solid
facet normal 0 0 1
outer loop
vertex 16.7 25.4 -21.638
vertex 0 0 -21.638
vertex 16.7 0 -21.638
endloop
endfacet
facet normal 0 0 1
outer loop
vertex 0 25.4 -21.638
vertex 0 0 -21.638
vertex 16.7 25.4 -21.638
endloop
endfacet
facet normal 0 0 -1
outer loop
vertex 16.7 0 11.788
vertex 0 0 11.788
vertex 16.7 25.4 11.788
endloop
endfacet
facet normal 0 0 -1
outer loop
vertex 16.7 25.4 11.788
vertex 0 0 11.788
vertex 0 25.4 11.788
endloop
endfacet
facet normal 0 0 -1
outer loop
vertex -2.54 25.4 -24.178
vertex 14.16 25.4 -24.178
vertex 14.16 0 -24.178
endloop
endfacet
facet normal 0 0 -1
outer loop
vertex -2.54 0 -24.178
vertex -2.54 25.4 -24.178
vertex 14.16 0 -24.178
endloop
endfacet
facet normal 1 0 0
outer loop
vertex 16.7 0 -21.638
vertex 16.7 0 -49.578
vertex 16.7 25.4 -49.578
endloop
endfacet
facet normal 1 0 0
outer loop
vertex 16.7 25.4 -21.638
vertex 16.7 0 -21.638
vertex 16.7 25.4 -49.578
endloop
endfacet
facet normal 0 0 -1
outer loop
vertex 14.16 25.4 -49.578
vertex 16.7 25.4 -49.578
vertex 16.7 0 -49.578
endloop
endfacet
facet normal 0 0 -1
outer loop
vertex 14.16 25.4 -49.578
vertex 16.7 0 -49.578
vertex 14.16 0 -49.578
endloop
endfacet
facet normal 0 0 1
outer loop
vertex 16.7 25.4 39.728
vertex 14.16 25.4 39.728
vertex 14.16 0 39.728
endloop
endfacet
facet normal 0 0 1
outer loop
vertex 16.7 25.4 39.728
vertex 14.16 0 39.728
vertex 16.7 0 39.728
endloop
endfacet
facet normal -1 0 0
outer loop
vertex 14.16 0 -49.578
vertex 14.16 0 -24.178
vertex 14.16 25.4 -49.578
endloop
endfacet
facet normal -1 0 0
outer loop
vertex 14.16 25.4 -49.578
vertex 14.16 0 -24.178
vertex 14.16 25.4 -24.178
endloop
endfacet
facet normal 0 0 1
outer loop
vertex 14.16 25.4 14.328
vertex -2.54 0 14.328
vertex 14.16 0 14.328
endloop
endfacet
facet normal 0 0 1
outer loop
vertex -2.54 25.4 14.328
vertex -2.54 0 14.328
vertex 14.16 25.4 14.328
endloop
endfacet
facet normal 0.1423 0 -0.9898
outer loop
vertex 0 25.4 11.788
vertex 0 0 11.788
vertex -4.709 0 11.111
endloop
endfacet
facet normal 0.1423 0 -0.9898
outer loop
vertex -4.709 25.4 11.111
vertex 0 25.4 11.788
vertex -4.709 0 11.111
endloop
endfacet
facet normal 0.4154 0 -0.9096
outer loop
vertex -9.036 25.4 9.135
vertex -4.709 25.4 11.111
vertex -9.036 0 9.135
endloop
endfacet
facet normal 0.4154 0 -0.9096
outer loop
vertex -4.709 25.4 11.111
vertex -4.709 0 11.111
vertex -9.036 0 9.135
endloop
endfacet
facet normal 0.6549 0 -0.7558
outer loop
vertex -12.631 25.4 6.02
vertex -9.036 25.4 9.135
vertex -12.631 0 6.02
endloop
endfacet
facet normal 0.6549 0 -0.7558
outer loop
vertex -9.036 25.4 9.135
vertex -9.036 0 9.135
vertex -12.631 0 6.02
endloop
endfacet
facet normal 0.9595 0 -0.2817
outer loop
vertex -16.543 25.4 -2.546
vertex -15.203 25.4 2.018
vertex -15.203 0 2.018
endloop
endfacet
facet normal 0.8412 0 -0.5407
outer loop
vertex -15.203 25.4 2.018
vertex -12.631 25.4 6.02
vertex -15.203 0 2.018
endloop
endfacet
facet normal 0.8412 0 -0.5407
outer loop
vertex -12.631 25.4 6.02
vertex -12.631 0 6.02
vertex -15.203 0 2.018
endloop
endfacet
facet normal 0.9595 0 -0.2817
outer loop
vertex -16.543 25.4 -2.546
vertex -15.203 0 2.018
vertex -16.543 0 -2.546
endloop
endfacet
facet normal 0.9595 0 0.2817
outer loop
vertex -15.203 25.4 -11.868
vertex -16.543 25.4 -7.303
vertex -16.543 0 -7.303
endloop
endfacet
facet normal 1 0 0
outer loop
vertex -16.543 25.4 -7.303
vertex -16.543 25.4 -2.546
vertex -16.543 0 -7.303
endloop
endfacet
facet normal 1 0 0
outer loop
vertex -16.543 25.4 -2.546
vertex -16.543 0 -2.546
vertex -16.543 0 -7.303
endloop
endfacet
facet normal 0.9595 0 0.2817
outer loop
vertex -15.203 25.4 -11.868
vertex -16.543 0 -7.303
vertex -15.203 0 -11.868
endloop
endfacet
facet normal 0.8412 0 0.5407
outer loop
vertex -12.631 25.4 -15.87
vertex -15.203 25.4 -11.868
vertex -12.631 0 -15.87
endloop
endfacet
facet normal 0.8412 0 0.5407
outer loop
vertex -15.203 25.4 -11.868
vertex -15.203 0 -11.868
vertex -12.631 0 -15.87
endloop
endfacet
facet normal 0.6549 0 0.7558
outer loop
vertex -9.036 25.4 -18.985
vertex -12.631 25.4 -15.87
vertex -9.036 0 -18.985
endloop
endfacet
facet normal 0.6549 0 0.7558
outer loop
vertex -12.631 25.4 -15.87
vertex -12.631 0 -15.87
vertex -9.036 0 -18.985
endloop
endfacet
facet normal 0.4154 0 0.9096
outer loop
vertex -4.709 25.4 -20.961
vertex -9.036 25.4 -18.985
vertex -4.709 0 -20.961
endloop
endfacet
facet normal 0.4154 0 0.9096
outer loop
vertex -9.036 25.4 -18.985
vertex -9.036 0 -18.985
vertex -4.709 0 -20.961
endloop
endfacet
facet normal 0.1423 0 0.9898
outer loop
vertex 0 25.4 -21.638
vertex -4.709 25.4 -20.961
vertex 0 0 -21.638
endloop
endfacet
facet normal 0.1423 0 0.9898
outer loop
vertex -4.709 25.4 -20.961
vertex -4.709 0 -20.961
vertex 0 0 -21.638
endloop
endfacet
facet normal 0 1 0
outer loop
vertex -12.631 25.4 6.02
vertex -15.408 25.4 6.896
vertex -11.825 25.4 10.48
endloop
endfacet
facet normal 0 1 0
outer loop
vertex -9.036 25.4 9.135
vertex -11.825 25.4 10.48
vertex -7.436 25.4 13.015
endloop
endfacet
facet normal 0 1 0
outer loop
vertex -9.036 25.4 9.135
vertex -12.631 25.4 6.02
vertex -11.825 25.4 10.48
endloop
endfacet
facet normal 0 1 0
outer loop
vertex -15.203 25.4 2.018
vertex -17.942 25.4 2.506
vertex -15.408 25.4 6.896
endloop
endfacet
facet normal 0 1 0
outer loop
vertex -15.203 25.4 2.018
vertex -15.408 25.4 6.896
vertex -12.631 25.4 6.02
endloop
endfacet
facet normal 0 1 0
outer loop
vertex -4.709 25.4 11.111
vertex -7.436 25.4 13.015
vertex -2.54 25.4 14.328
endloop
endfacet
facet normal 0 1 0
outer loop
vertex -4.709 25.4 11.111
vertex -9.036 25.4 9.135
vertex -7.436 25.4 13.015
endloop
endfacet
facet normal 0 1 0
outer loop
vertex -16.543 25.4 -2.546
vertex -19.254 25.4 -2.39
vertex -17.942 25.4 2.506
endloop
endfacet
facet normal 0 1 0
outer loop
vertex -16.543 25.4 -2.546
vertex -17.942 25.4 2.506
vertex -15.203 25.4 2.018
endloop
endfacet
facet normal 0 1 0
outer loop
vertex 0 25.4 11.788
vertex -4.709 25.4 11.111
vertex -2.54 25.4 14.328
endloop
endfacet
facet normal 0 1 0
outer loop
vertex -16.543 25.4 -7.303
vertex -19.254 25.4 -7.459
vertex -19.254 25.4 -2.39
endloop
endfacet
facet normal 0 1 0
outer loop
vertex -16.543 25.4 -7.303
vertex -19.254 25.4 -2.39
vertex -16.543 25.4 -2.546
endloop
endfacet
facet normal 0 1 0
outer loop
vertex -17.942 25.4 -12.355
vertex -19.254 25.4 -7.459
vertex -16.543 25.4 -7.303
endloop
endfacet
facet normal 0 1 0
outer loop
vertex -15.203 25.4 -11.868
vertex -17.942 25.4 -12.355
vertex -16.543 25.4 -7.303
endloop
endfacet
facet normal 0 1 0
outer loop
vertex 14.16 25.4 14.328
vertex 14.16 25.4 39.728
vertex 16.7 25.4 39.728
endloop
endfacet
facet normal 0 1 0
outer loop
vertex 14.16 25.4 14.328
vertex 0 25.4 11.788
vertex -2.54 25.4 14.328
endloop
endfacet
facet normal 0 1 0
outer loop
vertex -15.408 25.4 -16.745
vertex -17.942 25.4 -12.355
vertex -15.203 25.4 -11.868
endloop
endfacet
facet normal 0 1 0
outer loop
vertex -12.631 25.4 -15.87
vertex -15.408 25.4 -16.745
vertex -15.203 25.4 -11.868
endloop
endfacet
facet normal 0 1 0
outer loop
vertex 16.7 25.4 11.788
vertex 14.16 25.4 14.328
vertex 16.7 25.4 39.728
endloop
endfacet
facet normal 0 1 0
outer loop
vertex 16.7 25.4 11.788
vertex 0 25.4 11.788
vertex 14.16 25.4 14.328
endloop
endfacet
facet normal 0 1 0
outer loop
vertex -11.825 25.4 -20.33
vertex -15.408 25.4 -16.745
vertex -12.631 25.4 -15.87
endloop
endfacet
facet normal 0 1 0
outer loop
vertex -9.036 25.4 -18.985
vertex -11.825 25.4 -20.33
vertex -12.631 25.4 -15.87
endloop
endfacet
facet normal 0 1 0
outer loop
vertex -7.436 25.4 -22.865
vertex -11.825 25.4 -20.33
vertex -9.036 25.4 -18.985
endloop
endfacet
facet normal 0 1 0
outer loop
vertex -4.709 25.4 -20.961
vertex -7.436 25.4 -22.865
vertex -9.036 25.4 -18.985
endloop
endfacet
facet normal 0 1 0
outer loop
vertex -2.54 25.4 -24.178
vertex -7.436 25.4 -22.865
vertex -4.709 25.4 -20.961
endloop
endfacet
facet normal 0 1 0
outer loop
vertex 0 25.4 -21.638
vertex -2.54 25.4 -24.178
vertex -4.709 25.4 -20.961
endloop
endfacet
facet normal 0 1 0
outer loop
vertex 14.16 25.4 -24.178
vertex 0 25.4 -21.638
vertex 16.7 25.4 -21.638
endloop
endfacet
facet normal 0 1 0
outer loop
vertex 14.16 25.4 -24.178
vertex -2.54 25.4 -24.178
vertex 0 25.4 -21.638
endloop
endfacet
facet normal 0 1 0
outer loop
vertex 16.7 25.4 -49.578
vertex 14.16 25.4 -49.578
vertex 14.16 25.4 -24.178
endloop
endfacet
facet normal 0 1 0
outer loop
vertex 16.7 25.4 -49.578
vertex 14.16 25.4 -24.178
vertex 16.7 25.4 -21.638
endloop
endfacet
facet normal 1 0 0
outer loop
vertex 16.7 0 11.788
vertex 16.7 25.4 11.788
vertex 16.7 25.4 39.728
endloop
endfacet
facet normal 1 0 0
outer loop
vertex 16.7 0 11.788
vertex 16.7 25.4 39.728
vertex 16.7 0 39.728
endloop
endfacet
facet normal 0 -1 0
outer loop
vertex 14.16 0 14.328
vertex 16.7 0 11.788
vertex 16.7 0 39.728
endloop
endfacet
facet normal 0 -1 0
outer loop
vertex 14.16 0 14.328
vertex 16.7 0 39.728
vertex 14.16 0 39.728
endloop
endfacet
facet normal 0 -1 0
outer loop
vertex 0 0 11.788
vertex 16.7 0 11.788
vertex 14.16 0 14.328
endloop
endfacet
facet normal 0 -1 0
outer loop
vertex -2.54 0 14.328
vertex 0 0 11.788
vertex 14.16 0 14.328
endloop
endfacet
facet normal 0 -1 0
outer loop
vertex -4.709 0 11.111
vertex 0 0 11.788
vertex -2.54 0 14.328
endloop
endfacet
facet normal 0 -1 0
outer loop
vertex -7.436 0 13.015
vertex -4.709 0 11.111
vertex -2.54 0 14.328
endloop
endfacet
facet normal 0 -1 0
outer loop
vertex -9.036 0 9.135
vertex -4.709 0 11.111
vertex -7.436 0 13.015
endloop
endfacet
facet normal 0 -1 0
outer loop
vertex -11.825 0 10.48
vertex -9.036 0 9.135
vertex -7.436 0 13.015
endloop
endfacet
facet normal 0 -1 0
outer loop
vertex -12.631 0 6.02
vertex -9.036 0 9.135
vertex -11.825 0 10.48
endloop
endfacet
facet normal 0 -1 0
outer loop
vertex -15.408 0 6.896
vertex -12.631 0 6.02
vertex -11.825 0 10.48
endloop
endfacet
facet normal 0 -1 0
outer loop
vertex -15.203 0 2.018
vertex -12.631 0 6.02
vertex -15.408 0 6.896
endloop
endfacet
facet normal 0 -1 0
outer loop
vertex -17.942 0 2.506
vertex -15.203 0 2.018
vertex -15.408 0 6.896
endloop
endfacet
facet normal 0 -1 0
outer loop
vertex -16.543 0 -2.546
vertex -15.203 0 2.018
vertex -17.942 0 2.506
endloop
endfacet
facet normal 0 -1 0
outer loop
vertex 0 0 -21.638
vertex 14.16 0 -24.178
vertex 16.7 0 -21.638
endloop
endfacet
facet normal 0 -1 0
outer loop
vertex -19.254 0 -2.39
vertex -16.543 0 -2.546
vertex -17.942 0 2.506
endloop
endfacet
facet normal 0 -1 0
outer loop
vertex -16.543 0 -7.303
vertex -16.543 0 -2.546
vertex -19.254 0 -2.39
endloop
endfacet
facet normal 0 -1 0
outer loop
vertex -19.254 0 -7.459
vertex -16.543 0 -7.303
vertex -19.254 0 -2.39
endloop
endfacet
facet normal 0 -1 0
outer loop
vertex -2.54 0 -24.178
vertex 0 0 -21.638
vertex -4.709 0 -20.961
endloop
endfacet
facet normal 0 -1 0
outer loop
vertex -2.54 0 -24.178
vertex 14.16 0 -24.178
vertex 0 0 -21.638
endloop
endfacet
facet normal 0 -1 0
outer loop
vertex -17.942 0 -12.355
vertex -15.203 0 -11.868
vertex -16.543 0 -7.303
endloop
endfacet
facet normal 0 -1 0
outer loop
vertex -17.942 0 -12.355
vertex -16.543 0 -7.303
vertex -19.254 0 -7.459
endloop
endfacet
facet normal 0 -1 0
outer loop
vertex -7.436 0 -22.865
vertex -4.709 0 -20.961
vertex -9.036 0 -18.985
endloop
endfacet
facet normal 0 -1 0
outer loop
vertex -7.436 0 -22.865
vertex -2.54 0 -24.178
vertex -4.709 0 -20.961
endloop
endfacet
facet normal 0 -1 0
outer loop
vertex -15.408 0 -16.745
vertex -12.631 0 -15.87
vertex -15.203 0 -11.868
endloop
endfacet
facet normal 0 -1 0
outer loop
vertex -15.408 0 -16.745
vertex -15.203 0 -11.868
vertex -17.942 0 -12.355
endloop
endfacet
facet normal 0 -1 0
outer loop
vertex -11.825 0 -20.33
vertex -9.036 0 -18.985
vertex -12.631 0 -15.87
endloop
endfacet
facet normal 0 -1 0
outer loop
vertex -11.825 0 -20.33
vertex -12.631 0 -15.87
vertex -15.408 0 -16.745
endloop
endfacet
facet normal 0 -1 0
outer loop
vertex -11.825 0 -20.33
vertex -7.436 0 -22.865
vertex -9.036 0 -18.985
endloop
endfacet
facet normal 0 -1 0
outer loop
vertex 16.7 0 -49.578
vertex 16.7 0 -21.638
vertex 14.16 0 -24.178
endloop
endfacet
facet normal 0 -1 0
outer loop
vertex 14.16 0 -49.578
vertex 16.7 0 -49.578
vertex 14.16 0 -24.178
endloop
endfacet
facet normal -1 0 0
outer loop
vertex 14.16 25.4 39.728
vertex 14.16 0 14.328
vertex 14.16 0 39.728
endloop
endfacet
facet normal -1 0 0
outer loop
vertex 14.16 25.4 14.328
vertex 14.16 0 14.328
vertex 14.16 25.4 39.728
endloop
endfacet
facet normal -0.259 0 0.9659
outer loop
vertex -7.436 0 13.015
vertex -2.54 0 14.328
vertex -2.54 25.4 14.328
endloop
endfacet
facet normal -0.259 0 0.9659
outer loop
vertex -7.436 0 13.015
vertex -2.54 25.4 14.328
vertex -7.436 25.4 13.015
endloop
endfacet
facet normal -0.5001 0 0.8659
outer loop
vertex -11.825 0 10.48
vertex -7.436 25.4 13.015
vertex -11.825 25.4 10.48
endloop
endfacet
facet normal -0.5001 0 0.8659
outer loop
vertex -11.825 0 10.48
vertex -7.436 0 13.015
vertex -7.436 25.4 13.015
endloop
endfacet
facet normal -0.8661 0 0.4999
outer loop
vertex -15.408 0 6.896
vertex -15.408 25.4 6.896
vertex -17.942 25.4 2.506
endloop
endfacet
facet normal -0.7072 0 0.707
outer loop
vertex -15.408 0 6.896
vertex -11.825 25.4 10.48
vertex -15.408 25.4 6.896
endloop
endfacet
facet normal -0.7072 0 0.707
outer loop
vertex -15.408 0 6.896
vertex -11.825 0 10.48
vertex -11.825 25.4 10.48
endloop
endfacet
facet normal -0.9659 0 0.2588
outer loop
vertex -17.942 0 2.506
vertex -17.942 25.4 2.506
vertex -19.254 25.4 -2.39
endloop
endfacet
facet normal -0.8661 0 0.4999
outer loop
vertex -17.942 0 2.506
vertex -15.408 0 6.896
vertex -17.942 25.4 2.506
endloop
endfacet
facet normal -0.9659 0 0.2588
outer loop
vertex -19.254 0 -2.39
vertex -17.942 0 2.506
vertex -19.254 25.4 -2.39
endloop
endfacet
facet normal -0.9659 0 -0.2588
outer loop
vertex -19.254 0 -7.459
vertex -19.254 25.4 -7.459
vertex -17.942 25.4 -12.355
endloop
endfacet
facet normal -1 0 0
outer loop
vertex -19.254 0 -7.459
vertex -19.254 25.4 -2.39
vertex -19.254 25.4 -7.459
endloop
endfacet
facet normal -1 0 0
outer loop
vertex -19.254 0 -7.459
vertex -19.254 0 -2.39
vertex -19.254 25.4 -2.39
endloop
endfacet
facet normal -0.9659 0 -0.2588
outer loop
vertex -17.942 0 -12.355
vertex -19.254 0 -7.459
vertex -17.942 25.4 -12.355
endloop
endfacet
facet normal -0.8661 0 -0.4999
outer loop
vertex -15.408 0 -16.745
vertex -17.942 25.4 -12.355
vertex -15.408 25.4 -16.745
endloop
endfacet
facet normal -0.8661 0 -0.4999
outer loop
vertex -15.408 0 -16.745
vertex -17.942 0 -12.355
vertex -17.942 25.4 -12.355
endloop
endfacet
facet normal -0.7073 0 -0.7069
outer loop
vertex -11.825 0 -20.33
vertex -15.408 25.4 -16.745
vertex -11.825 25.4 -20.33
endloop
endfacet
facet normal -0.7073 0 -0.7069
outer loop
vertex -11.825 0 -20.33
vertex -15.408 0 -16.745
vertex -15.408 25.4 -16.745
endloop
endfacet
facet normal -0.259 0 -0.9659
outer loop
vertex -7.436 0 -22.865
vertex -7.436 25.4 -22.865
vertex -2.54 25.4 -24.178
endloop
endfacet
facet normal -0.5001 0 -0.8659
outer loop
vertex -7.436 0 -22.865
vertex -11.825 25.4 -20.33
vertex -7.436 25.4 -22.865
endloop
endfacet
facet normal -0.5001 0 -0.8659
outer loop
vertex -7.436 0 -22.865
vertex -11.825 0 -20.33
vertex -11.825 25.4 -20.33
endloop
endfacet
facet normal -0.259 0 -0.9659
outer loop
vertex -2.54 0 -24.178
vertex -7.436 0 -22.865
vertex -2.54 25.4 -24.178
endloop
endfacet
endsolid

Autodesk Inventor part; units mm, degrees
ref_plane "YZ Plane" through (0, 0, 0) normal (1, 0, 0) x (0, 1, 0)
ref_plane "XZ Plane" through (0, 0, 0) normal (0, 1, 0) x (-1, 0, 0)
ref_plane "XY Plane" through (0, 0, 0) normal (0, 0, 1) x (1, 0, 0)
sketch "Sketch1" plane through (0, 0, 0) normal (0, 1, 0) x (-1, 0, 0)
  arc A0 (0, -21.6252) -> (0, 11.7758) centre (0, -4.9247) ccw
  line L0 (0, 37.1885) -> (0, 11.7885)
  line L1 (0, -21.6379) -> (0, -47.0379)
  arc A1 (0, -21.6379) -> (0, 11.7885) centre (0, -4.9247) ccw
  line L2 (0, 37.1885) -> (2.54, 37.1885)
  line L3 (0, -47.0379) -> (2.54, -47.0379)
  line L4 (2.54, 37.1885) -> (2.54, 14.3285)
  line L5 (2.54, -47.0379) -> (2.54, -24.1779)
  arc A2 (2.54, -24.1779) -> (2.54, 14.3285) centre (0, -4.9247) ccw
  dimension "d0" = 33.401
  dimension "d1" = 25.4
  dimension "d2" = 25.4
  dimension "d3" = 33.4264
  dimension "d6" = 16.7132
  dimension "d7" = 16.7132
  dimension "d8" = 2.54
  dimension "d9" = 2.54
  dimension "d10" = 19.2532
  dimension "d11" = 19.2532
extrude "Extrusion1" add sketch "Sketch1" along normal blind 25.4
sketch "Sketch2" plane through (0, 0, 37.1885) normal (1, 0, 0) x (0, 0, -1)
  line L0 (25.4, 0) -> (25.4, 25.4) projected
  line L1 (22.86, 0) -> (22.86, 25.4) projected
  line L2 (25.4, 25.4) -> (22.86, 25.4)
  line L3 (22.86, 25.4) -> (22.86, 0)
  line L4 (22.86, 0) -> (25.4, 0)
  line L5 (25.4, 0) -> (25.4, 25.4)
  line L6 (25.4, 25.4) -> (58.8264, 25.4) projected
  line L7 (61.3664, 0) -> (22.86, 0) projected
  line L8 (58.8264, 25.4) -> (61.3664, 25.4)
  line L9 (61.3664, 25.4) -> (61.3664, 0)
  line L10 (61.3664, 0) -> (58.8264, 0)
  line L11 (58.8264, 0) -> (58.8264, 25.4)
  point P0 (37.1885, 0)
extrude "Extrusion2" add sketch "Sketch2" along normal blind 16.7005 contours L4 L1 L2 L0 | L11 L8 L9 L7
sketch "Sketch3" plane through (0, 0, -47.0379) normal (1, 0, 0) x (0, 0, -1)
  line L0 (0, 25.4) -> (-22.86, 25.4) projected
  line L1 (-22.86, 0) -> (0, 0) projected
  line L2 (0, 25.4) -> (-22.86, 25.4)
  line L3 (-22.86, 25.4) -> (-22.86, 0)
  line L4 (-22.86, 0) -> (0, 0)
  line L5 (0, 0) -> (0, 25.4)
  line L6 (-61.3664, 25.4) -> (-84.2264, 25.4) projected
  line L7 (-22.86, 0) -> (-61.3664, 0) projected
  line L8 (-84.2264, 25.4) -> (-61.3664, 25.4)
  line L9 (-61.3664, 25.4) -> (-61.3664, 0)
  line L10 (-61.3664, 0) -> (-84.2264, 0)
  line L11 (-84.2264, 0) -> (-84.2264, 25.4)
  point P0 (-47.0379, 0)
extrude "Extrusion3" cut sketch "Sketch3" against normal blind 16.7005
sketch "Sketch4" plane through (16.7005, 25.4, -24.1779) normal (0, 0, -1) x (-1, 0, 0)
  line L0 (0, -25.4) -> (0, 0) projected
  line L1 (16.7005, 0) -> (0, 0) projected
  line L2 (0, -25.4) -> (2.54, -25.4)
  line L3 (2.54, -25.4) -> (2.54, 0)
  line L4 (2.54, 0) -> (0, 0)
  line L5 (0, 0) -> (0, -25.4)
  point P0 (16.7005, -25.4)
  dimension "d18" = 2.54
extrude "Extrusion4" add sketch "Sketch4" along normal blind 25.4
sketch "Sketch5" plane through (-2.54, 0, 14.3285) normal (0, 0, 1) x (1, 0, 0)
  line L0 (19.2405, 25.4) -> (19.2405, 0) projected
  line L1 (16.7005, 0) -> (16.7005, 25.4) projected
  line L2 (19.2405, 0) -> (16.7005, 0)
  line L3 (16.7005, 0) -> (16.7005, 25.4)
  line L4 (16.7005, 25.4) -> (19.2405, 25.4)
  line L5 (19.2405, 25.4) -> (19.2405, 0)
  point P0 (2.54, 0)
extrude "Extrusion5" add sketch "Sketch5" along normal blind 25.4
equation "\"d2\" = d1"
equation "\"d7\" = d6"
equation "\"d9\" = d8"
properties part number "Attachy-thing Derek"
